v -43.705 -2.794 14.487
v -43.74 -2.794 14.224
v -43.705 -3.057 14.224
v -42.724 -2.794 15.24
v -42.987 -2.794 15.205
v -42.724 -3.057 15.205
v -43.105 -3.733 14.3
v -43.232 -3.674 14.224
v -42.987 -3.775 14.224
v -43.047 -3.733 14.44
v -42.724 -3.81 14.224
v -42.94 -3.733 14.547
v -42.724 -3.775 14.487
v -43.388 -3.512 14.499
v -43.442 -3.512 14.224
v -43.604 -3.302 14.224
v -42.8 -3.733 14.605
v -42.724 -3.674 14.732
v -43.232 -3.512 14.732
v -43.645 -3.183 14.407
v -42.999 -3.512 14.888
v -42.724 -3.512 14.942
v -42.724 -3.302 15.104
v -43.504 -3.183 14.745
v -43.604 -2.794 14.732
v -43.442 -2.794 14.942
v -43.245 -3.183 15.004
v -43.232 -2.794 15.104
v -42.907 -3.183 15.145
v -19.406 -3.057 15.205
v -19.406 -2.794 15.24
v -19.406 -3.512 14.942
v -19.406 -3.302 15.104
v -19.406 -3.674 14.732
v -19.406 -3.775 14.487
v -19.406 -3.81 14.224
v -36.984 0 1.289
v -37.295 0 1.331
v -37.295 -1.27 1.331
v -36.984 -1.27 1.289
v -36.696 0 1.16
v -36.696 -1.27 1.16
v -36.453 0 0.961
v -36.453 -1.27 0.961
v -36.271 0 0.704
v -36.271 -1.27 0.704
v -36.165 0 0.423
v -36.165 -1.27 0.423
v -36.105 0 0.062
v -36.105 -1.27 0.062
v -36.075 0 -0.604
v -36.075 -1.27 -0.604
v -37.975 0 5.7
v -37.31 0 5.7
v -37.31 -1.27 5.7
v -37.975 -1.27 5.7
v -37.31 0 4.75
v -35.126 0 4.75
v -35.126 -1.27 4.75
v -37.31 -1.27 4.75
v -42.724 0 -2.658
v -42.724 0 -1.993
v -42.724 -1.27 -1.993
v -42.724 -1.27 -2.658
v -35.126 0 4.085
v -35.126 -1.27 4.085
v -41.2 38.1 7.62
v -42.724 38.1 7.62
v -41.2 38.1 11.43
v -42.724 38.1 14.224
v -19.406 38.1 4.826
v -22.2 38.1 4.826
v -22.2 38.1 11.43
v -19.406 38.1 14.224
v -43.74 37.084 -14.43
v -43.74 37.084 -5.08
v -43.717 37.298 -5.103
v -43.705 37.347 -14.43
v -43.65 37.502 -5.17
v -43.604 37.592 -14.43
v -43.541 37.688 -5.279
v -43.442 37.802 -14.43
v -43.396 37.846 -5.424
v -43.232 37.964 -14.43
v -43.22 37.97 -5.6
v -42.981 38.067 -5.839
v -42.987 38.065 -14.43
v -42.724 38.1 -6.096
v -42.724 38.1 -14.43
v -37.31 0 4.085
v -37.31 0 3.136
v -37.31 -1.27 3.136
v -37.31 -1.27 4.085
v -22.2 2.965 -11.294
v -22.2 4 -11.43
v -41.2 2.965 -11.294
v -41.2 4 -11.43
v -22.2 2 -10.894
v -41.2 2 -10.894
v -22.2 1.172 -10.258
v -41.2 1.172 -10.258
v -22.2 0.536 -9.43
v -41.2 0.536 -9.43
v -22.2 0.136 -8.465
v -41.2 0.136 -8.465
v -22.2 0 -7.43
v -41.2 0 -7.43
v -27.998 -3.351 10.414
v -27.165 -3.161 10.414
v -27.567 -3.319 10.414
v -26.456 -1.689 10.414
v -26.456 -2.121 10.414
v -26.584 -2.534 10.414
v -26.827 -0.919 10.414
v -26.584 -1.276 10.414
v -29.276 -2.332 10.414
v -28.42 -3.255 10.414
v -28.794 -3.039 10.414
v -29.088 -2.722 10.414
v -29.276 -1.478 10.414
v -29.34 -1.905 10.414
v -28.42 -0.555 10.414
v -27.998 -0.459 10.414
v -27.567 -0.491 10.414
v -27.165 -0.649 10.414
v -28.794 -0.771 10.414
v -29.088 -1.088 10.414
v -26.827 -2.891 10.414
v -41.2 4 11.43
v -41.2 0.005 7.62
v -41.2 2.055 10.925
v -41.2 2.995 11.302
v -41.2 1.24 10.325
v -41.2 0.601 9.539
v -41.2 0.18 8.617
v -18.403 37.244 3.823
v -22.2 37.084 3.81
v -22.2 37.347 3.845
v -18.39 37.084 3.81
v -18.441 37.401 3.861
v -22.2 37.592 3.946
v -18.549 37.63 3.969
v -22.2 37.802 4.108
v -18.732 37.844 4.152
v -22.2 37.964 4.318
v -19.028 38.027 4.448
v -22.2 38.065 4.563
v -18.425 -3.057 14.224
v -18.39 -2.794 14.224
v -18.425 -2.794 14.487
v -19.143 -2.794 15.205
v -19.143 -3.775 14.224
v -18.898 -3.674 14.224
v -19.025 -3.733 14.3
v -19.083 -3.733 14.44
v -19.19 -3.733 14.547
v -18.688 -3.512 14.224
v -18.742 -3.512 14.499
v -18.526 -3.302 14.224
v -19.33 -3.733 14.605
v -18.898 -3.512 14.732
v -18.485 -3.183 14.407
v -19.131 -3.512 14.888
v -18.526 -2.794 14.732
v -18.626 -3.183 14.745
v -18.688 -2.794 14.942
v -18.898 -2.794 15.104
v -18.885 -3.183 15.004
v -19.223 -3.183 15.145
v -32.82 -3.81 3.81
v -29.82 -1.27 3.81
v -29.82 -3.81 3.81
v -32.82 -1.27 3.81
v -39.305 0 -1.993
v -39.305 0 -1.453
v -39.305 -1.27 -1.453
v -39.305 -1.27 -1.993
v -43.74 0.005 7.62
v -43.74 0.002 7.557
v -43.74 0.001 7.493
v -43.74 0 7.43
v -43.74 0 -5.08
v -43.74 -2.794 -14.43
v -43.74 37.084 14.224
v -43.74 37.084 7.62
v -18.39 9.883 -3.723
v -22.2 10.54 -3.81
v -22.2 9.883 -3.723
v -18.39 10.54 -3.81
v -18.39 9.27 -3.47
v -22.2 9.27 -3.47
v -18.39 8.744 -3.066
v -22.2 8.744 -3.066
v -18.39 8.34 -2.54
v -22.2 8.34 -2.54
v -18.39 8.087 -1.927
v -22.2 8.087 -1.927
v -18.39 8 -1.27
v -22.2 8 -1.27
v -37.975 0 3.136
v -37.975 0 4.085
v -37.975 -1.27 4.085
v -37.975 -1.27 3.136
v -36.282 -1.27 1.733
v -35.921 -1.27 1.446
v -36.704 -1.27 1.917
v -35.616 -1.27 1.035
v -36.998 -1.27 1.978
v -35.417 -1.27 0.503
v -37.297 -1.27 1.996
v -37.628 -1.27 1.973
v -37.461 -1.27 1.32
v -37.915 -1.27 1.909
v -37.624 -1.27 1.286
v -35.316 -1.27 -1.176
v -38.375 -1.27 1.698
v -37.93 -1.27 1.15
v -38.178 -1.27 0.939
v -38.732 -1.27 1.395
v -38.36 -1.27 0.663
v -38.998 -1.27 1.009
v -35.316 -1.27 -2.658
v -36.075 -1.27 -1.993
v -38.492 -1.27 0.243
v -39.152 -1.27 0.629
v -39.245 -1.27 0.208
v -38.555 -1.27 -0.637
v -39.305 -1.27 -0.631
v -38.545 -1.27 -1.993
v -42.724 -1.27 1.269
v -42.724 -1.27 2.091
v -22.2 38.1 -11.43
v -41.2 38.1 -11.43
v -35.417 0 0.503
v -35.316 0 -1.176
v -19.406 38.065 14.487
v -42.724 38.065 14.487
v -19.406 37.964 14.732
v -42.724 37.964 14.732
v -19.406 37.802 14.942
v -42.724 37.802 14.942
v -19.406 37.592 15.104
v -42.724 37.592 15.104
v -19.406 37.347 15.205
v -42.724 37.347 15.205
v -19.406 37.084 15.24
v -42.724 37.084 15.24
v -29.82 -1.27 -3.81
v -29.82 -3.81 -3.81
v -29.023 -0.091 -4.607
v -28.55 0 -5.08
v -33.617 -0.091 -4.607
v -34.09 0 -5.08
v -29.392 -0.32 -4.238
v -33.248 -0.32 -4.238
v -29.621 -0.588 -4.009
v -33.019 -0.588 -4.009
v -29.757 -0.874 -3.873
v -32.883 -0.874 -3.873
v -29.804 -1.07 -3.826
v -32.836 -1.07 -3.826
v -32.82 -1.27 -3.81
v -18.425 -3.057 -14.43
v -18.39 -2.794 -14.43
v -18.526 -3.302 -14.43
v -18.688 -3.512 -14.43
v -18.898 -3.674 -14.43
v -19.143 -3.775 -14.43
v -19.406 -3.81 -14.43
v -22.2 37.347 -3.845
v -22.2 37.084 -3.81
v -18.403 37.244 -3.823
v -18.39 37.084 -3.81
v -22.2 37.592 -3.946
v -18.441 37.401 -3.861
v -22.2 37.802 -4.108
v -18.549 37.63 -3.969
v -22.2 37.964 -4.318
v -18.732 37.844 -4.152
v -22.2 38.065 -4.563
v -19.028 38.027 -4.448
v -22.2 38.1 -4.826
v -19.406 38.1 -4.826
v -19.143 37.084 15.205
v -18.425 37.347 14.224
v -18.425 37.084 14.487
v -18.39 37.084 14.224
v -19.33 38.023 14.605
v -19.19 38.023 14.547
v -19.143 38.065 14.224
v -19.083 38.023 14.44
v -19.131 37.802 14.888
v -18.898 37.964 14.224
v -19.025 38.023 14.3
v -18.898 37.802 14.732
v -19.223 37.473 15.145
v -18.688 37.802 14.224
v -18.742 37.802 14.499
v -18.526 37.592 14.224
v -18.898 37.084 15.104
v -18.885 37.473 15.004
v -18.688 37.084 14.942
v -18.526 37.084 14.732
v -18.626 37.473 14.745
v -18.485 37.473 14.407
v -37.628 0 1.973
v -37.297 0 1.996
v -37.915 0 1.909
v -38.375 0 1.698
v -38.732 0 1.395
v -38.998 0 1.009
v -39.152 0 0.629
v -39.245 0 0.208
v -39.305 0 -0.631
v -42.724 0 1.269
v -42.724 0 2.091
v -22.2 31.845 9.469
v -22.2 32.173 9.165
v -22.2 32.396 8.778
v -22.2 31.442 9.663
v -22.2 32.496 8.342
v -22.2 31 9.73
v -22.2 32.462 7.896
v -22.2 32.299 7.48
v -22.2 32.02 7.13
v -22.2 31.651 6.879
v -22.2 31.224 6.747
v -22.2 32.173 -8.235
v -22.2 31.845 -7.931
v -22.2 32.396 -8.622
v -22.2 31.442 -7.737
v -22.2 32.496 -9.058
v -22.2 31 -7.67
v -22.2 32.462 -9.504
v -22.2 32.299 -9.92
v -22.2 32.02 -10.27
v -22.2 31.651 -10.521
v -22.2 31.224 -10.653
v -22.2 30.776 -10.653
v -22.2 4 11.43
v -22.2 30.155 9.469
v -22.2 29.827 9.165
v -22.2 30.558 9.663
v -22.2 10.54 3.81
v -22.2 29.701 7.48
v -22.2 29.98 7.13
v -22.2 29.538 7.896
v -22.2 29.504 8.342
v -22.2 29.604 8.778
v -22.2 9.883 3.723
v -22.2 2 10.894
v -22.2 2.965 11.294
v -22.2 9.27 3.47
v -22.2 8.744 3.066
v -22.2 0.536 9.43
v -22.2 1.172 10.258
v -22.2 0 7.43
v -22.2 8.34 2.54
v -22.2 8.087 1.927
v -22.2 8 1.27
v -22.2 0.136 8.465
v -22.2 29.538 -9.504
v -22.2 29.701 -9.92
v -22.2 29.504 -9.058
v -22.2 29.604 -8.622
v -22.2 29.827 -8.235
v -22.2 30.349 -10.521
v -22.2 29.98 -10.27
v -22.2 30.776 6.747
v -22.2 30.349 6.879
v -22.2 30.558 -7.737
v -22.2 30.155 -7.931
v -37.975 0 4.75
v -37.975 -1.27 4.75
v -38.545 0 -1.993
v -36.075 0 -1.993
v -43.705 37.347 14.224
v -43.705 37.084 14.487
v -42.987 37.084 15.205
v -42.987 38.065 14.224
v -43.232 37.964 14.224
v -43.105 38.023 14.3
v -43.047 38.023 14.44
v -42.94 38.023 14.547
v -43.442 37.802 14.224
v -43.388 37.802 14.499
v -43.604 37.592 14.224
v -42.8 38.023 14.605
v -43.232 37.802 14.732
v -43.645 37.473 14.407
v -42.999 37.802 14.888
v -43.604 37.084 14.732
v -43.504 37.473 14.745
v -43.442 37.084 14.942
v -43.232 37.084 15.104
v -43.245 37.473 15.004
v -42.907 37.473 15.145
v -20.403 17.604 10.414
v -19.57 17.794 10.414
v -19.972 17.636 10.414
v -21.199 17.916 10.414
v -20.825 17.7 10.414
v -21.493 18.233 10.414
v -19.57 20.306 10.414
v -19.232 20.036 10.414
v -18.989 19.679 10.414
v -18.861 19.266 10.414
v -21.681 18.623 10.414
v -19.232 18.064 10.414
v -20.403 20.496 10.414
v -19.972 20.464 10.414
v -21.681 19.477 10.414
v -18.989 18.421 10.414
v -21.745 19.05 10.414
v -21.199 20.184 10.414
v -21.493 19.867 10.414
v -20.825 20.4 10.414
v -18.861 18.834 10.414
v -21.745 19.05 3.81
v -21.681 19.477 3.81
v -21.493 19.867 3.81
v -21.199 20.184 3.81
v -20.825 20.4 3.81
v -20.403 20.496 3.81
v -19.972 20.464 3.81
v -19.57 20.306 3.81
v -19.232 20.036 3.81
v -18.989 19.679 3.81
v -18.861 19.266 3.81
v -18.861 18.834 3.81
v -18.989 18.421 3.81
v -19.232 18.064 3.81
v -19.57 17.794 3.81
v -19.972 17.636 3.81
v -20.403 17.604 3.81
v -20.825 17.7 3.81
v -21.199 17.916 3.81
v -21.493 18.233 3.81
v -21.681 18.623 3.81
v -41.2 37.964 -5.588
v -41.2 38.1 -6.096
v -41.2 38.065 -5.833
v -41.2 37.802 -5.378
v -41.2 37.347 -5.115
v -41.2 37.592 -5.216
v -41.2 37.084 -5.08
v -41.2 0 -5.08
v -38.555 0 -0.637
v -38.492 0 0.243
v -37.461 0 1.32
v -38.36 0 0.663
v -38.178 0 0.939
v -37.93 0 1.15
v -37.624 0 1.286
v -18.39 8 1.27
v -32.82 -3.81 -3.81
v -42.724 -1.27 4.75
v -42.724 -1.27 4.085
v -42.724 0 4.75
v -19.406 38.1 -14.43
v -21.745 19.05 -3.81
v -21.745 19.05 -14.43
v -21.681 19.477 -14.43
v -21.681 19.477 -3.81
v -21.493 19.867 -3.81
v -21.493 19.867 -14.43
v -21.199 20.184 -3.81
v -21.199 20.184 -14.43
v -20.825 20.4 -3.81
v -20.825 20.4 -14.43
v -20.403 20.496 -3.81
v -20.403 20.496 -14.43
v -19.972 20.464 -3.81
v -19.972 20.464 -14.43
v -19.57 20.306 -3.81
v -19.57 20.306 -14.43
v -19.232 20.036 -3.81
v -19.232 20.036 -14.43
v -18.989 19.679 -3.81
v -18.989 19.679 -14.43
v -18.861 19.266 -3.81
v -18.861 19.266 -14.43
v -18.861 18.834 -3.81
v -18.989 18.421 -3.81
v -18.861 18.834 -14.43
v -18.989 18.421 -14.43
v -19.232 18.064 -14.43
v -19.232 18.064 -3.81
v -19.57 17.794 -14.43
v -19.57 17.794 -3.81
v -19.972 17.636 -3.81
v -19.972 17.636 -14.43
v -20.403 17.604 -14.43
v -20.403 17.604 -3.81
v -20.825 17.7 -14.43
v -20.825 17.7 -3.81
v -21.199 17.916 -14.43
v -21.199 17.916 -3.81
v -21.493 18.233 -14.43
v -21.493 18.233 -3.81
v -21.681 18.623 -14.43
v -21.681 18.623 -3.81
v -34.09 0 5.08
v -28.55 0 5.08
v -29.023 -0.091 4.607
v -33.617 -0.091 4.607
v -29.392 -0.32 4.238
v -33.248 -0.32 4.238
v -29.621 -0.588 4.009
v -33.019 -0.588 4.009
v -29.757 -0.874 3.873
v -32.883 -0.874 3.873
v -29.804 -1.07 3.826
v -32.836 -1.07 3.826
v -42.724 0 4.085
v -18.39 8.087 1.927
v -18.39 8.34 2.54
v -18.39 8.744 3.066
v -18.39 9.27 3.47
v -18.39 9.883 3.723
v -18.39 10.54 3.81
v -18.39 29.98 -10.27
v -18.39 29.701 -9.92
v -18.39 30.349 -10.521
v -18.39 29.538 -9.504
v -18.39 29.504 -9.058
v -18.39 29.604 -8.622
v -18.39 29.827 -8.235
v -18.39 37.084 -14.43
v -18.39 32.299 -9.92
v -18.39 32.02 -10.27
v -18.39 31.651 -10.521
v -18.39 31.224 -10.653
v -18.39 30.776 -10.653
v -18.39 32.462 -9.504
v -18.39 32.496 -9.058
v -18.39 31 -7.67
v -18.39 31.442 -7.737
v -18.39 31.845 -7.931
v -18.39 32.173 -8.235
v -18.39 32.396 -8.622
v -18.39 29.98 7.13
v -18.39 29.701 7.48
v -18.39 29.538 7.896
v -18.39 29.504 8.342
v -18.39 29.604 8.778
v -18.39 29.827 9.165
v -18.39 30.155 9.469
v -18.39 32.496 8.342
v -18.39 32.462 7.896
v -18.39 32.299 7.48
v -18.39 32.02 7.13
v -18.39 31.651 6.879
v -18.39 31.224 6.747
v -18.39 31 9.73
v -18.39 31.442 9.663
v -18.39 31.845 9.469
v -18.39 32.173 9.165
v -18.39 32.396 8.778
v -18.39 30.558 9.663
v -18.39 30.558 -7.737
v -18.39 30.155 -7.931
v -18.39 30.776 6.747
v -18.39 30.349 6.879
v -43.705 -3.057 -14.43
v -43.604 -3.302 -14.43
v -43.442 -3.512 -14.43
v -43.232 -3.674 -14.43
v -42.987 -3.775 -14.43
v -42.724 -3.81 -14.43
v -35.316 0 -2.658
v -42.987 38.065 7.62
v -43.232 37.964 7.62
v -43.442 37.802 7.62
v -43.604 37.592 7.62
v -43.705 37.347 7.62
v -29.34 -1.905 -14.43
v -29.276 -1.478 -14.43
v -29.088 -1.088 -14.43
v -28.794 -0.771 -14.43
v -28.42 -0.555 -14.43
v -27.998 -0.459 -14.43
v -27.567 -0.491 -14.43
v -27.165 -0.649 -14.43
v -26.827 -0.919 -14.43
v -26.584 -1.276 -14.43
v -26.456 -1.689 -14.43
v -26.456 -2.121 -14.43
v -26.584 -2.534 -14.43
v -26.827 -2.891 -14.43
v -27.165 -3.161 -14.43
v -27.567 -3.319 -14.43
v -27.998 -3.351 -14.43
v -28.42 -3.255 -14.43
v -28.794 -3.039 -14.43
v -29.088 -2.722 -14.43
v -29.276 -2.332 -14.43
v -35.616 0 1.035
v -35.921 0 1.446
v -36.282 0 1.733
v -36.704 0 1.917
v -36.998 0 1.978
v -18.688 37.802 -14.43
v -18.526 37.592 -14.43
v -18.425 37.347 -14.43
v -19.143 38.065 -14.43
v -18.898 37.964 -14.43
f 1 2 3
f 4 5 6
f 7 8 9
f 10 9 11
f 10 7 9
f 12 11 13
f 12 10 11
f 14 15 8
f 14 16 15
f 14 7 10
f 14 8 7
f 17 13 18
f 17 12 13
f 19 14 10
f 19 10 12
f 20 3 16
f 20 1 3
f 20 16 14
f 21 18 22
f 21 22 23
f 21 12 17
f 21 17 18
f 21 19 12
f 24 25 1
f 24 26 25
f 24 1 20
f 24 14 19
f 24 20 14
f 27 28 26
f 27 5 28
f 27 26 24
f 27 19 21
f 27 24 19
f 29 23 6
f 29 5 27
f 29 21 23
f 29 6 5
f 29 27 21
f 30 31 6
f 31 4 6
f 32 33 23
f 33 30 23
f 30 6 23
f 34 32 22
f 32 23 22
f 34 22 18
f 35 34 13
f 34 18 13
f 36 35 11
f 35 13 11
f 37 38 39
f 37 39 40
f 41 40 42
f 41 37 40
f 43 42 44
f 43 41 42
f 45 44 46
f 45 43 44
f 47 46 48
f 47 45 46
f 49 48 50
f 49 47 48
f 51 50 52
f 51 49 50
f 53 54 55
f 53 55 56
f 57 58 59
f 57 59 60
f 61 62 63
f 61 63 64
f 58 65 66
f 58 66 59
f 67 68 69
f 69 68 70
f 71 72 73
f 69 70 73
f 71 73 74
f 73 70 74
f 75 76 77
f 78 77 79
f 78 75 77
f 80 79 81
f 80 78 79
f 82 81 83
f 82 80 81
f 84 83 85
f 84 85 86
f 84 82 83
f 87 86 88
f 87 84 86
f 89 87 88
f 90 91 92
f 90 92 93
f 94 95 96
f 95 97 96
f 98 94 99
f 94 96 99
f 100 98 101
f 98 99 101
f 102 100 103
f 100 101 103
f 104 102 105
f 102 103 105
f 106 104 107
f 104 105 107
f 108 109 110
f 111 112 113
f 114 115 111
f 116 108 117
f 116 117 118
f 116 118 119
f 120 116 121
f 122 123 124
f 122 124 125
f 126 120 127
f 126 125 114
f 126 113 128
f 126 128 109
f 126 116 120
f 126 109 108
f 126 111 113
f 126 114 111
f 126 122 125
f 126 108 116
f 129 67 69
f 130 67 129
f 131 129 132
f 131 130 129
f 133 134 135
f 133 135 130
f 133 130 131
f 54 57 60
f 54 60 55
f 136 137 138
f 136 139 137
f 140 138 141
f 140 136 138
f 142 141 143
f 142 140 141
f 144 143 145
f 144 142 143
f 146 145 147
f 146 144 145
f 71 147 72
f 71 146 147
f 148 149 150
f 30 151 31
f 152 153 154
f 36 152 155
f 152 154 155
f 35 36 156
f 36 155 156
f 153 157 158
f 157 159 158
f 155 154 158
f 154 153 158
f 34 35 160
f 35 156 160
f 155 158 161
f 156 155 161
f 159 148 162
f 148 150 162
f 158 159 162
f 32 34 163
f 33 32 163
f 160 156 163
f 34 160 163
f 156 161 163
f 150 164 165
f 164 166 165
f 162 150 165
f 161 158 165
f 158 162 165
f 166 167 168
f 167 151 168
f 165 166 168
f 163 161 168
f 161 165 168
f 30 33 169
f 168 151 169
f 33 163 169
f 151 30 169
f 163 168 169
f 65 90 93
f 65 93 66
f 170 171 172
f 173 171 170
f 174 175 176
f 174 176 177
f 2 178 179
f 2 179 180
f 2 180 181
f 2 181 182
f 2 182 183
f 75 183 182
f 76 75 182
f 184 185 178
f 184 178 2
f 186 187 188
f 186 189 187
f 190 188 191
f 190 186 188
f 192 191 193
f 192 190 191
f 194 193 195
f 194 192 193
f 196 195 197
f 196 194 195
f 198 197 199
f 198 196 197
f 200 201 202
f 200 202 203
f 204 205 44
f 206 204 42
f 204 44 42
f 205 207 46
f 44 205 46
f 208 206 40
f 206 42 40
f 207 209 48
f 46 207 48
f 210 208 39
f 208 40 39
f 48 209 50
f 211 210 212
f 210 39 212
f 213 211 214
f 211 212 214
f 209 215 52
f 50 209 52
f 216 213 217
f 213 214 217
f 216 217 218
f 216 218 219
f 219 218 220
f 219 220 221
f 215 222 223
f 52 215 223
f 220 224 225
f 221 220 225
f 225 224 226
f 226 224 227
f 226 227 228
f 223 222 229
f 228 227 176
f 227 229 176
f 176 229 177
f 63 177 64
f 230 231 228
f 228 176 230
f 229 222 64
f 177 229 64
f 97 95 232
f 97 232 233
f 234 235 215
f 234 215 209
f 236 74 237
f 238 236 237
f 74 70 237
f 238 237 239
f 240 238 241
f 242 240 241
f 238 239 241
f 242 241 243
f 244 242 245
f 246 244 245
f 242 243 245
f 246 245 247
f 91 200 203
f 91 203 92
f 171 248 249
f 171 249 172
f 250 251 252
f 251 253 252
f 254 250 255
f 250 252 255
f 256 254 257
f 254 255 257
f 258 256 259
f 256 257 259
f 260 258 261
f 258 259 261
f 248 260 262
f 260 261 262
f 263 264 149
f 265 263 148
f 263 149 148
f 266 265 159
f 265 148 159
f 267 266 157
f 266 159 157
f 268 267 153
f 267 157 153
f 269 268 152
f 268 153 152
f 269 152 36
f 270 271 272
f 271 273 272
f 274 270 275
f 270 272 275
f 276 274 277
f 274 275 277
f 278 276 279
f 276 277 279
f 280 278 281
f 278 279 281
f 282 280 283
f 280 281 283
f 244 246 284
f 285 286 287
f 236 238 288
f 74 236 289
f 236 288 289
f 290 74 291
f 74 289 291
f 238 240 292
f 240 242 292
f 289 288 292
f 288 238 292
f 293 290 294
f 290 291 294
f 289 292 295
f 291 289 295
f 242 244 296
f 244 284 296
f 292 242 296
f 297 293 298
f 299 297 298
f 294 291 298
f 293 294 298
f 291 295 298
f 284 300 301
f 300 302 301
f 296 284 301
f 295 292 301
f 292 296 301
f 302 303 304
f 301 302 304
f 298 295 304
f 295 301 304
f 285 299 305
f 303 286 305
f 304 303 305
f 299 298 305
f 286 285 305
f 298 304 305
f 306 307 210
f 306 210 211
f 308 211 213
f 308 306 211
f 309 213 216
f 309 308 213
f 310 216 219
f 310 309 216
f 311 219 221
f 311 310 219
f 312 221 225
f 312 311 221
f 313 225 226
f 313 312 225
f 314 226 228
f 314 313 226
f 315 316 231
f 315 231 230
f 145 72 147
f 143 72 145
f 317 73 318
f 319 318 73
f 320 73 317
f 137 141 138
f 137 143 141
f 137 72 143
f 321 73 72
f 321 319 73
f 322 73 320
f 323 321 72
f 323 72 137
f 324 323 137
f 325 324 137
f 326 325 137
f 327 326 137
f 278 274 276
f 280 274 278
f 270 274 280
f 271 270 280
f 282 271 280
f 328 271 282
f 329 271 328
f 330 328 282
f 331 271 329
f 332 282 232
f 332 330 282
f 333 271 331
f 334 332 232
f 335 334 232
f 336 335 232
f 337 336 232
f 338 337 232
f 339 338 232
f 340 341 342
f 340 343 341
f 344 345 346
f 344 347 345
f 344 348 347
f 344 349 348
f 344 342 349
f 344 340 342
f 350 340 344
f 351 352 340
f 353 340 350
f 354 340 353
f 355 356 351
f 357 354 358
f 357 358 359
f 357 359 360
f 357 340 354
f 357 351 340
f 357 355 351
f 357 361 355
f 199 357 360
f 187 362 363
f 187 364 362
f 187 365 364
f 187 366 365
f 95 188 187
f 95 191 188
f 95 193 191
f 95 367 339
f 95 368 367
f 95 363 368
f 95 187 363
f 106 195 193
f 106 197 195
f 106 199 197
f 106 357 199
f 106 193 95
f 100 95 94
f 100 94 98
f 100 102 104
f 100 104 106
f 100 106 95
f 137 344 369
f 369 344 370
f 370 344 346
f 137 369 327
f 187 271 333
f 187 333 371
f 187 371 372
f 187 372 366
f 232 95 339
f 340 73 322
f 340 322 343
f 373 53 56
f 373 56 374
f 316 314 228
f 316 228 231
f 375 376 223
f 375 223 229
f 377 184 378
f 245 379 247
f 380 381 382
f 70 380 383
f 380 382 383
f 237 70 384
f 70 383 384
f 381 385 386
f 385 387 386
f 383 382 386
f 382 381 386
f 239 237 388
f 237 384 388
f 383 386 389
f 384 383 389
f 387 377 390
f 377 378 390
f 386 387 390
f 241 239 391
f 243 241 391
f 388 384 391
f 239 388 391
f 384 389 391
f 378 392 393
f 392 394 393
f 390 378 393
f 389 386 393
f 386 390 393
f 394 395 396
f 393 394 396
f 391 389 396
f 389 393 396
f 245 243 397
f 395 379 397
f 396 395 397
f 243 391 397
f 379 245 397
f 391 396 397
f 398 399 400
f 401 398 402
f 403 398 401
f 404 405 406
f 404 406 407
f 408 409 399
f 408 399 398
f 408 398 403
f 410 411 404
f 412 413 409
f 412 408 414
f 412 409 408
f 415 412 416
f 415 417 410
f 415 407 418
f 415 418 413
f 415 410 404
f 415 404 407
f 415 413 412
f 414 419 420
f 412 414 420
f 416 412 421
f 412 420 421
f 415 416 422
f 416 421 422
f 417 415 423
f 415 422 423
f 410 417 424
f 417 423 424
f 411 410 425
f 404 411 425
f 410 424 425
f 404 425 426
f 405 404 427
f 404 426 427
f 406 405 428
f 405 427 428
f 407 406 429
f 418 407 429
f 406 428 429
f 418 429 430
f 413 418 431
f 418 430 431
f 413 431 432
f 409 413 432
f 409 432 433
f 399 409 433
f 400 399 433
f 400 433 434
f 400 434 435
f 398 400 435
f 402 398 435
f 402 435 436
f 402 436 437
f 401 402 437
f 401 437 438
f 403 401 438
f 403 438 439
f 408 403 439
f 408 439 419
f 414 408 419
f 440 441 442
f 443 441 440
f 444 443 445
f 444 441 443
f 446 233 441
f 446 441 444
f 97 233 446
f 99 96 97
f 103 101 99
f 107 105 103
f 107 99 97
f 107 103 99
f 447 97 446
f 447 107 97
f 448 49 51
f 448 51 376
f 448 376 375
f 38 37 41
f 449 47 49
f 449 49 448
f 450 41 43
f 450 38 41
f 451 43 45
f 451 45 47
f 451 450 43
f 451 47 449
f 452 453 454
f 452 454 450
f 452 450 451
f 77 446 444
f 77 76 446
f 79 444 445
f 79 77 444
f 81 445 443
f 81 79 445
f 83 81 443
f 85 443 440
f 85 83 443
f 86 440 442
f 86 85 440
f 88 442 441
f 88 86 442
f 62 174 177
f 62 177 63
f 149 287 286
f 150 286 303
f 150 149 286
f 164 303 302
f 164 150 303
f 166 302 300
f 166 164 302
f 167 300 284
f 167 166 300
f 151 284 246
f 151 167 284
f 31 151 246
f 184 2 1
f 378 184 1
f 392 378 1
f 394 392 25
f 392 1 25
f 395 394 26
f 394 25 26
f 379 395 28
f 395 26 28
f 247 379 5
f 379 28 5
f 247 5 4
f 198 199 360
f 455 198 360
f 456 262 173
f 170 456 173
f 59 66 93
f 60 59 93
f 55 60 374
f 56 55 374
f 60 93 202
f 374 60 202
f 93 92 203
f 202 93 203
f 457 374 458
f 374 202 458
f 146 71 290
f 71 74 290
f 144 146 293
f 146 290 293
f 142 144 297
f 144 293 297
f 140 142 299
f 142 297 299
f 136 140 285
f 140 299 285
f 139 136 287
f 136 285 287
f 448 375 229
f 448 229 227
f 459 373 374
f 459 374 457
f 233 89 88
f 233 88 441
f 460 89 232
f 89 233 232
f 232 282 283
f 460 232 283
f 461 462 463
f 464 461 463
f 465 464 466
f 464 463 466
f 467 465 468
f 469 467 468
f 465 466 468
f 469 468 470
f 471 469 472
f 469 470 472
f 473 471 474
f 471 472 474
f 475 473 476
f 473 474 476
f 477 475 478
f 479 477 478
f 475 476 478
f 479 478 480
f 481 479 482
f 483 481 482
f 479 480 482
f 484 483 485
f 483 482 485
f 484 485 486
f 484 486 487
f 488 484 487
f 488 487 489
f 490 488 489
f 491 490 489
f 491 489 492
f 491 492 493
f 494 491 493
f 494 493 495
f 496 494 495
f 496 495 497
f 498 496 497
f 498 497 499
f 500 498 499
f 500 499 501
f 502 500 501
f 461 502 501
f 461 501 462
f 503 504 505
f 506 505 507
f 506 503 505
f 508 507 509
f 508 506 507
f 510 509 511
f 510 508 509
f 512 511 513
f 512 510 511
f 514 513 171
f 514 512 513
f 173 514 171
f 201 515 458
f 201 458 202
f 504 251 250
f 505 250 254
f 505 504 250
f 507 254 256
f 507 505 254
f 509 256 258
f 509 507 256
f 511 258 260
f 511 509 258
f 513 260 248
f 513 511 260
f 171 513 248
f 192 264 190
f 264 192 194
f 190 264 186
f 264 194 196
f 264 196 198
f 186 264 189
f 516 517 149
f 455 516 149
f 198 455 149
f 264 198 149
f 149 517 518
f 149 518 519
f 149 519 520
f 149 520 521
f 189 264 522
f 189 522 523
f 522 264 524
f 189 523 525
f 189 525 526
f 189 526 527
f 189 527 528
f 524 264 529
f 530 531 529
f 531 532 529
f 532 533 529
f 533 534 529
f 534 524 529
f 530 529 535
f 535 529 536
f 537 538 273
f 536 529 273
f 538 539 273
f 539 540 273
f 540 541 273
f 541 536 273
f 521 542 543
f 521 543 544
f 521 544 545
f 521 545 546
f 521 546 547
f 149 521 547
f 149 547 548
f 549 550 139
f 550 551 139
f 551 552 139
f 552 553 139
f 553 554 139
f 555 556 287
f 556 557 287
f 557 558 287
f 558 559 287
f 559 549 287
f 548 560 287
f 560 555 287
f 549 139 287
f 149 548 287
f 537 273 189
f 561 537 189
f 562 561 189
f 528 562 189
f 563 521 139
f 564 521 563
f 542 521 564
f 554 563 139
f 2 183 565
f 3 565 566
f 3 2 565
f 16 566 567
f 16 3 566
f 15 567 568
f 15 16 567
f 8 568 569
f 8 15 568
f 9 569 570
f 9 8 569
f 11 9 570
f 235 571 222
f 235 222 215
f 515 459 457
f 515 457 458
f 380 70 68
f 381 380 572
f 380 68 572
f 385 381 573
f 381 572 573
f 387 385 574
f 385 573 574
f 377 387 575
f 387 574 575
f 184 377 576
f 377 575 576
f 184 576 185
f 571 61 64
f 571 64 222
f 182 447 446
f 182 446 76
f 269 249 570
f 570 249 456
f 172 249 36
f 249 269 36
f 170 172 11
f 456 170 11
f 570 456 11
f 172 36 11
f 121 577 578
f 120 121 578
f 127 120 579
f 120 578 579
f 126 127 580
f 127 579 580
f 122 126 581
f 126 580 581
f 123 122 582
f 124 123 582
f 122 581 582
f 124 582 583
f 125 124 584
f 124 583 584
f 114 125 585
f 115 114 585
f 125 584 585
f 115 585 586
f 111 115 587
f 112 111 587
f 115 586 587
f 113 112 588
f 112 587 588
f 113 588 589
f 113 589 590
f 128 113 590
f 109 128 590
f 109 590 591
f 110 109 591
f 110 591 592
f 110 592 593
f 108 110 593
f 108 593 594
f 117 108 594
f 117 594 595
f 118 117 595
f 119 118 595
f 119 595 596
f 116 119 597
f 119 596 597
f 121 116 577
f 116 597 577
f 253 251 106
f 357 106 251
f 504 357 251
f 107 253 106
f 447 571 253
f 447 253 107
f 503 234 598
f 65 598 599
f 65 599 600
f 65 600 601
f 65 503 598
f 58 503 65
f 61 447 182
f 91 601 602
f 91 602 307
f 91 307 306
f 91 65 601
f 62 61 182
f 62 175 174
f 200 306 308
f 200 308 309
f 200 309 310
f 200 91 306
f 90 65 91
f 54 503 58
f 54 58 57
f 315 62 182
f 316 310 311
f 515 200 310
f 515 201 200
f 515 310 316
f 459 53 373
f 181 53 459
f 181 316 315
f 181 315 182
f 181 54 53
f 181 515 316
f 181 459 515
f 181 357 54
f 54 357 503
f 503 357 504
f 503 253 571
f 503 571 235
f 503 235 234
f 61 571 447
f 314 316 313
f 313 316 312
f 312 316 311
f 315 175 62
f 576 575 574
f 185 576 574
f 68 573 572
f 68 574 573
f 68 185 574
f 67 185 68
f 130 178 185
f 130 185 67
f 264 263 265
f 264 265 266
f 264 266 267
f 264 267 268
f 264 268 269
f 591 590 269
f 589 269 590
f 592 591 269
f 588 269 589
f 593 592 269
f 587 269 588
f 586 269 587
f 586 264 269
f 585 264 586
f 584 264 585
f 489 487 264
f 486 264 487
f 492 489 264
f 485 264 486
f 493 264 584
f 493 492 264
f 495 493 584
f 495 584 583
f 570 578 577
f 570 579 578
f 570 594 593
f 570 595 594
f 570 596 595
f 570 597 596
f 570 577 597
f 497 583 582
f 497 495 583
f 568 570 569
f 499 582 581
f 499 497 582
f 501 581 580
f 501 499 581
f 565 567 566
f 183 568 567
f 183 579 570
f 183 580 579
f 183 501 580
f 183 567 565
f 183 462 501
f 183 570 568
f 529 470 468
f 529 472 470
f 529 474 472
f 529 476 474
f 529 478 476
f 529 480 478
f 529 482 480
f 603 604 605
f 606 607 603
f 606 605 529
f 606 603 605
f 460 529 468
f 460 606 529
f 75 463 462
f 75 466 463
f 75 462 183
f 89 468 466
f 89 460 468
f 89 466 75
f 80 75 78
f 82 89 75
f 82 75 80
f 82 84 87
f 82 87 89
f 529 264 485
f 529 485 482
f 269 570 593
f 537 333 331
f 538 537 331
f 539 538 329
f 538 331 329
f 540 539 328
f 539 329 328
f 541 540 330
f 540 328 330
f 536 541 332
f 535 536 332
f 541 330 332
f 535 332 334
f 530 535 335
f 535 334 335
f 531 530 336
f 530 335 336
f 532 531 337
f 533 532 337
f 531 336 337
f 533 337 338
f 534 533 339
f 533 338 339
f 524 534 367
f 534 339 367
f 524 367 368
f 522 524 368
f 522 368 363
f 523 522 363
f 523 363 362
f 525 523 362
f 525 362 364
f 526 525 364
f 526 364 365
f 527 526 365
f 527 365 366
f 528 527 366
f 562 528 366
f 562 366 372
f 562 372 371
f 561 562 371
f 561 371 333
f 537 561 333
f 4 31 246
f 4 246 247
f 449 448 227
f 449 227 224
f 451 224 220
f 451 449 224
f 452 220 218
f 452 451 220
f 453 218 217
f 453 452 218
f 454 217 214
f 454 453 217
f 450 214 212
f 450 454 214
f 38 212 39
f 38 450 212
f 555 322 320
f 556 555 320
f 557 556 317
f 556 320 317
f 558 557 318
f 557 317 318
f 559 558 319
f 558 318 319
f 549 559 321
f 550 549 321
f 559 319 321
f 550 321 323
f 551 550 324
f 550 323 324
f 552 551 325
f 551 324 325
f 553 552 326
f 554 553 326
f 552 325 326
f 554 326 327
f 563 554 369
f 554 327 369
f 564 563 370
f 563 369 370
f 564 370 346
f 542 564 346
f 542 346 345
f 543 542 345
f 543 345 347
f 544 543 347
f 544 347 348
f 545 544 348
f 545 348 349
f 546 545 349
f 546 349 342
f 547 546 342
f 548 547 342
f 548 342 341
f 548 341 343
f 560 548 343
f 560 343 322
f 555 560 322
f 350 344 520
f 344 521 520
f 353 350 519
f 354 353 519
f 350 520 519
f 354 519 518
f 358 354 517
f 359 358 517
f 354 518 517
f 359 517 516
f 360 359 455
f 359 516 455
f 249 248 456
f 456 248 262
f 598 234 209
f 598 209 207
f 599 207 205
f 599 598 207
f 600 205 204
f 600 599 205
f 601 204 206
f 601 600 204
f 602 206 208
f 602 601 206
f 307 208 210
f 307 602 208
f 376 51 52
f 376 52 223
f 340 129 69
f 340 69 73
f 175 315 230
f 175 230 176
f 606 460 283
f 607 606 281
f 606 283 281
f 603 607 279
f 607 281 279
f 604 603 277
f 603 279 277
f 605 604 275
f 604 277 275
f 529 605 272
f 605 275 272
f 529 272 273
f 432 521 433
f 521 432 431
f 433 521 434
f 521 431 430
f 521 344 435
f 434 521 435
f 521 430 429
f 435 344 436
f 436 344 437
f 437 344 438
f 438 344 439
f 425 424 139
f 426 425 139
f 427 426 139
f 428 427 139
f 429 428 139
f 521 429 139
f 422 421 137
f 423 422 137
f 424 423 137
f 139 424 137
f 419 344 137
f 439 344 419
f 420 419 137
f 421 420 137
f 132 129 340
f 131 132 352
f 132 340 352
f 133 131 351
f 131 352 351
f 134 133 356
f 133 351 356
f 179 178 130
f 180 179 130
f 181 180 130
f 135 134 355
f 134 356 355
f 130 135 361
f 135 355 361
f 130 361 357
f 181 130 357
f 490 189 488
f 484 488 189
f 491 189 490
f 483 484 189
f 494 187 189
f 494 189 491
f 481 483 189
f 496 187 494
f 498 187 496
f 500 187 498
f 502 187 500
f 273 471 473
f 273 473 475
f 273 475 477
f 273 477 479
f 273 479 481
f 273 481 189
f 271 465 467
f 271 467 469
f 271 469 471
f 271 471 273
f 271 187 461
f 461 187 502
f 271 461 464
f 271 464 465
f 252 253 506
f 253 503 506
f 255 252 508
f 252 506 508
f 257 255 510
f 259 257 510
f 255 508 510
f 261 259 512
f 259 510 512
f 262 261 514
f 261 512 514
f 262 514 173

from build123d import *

# Parameters (mm, degrees)
BOSS_EXTRUDE2_DEPTH = 38.1
SKETCH1_W           = 25.35
SKETCH1_H           = 29.67
BOSS_EXTRUDE3_DEPTH = 3.81
SKETCH3_W           = 3
SKETCH3_H           = 7.62
CUT_EXTRUDE1_DEPTH  = 4.81
SKETCH4_W           = 7.62
SKETCH4_H           = 30.1
CUT_EXTRUDE2_DEPTH  = 4.81
SKETCH5_R           = 1.5
CUT_EXTRUDE3_DEPTH  = 4.81
SKETCH6_R           = 1.45
CUT_EXTRUDE4_DEPTH  = 24.844
FILLET1_R           = 4
FILLET4_R           = 2.54
FILLET2_R           = 1.016
FILLET3_R           = 1.27
FILLET5_R           = 1.016
CUT_EXTRUDE5_DEPTH  = 1.27
CUT_EXTRUDE6_DEPTH  = 1.27


with BuildPart() as part:
    # Sketch2 → Boss-Extrude2 (new body)
    with BuildSketch(Plane(origin=(0, 0, 0), x_dir=(1, 0, 0), z_dir=(0, 1, 0))):
        Polygon((-9.5, -11.43), (9.5, -11.43), (9.5, -5.08), (12.04, -5.08), (12.04, -14.43), (-13.31, -14.43), (-13.31, 15.24), (12.04, 15.24), (12.04, 7.62), (9.5, 7.62), (9.5, 11.43), (-9.5, 11.43), align=None)
    extrude(amount=BOSS_EXTRUDE2_DEPTH)

    # Sketch1 → Boss-Extrude3 (add)
    with BuildSketch(Plane(origin=(0, 0, 0), x_dir=(1, 0, 0), z_dir=(0, 1, 0))):
        with Locations((-0.635, 0.405)):
            Rectangle(SKETCH1_W, SKETCH1_H)
    extrude(amount=-BOSS_EXTRUDE3_DEPTH)

    # Sketch3 → Cut-Extrude1 (cut, through all)
    with BuildSketch(Plane(origin=(0, 0, 0), x_dir=(1, 0, 0), z_dir=(0, 1, 0))):
        with Locations((-0.38, 0)):
            Rectangle(SKETCH3_W, SKETCH3_H)
    extrude(amount=-CUT_EXTRUDE1_DEPTH, mode=Mode.SUBTRACT)

    # Sketch4 → Cut-Extrude2 (cut, through all)
    with BuildSketch(Plane(origin=(-9.5, 0, 0), x_dir=(0, 0, -1), z_dir=(1, 0, 0))):
        with Locations((0, 23.05)):
            Rectangle(SKETCH4_W, SKETCH4_H)
    extrude(amount=-CUT_EXTRUDE2_DEPTH, mode=Mode.SUBTRACT)

    # Sketch5 → Cut-Extrude3 (cut, through all)
    with BuildSketch(Plane(origin=(-9.5, 0, 0), x_dir=(0, 0, -1), z_dir=(1, 0, 0))):
        with Locations((-9.1700096, 31)):
            Circle(SKETCH5_R)
        with Locations((8.2299904, 31)):
            Circle(SKETCH5_R)
    extrude(amount=-CUT_EXTRUDE3_DEPTH, mode=Mode.SUBTRACT)

    # Sketch6 → Cut-Extrude4 (cut)
    with BuildSketch(Plane.XY.offset(14.43)):
        with Locations((-11.405, 19.05)):
            Circle(SKETCH6_R)
        with Locations((-3.81, -1.905)):
            Circle(SKETCH6_R)
    extrude(amount=-CUT_EXTRUDE4_DEPTH, mode=Mode.SUBTRACT)

    # Fillet1
    fillet1_edges = [part.edges().sort_by_distance(p)[0] for p in [
        (0, 0, -11.43),
        (0, 0, 11.43),
    ]]
    fillet(fillet1_edges, radius=FILLET1_R)


with BuildPart() as body_2:
    # Mirror1: mirrored copy
    add(part.part.mirror(Plane.XY))

    # Fillet4
    fillet4_edges = [body_2.edges().sort_by_distance(p)[0] for p in [
        (-11.405, 8, -3.81),
        (-11.405, 8, 3.81),
    ]]
    fillet(fillet4_edges, radius=FILLET4_R)

    # Fillet2
    fillet2_edges = [body_2.edges().sort_by_distance(p)[0] for p in [
        (-13.31, 17.145, 15.24),
        (12.04, 17.145, 15.24),
        (12.04, -3.81, 0.405),
        (-13.31, -3.81, 0.405),
        (-0.635, -3.81, 15.24),
        (12.04, 38.1, 11.43),
        (-0.635, 38.1, 15.24),
        (-13.31, 38.1, 9.525),
        (-13.31, 38.1, -9.12),
        (-11.405, 38.1, -3.81),
        (-11.405, 38.1, 3.81),
    ]]
    fillet(fillet2_edges, radius=FILLET2_R)

    # Fillet3
    fillet3_edges = [body_2.edges().sort_by_distance(p)[0] for p in [
        (-1.88, 0, 0),
        (-0.38, 0, -3.81),
        (1.12, 0, 0),
        (-0.38, 0, 3.81),
    ]]
    fillet(fillet3_edges, radius=FILLET3_R)

    # Fillet5
    fillet5_edges = [body_2.edges().sort_by_distance(p)[0] for p in [
        (12.04, 38.1, -9.755),
        (10.77, 38.1, -5.08),
    ]]
    fillet(fillet5_edges, radius=FILLET5_R)


with BuildPart() as body_2_2:
    # Mirror3: mirrored copy
    add(body_2.part.mirror(Plane.ZY.offset(15.85)))

    # Sketch8 → Cut-Extrude6 (cut)
    with BuildSketch(Plane(origin=(0, 0, 0), x_dir=(1, 0, 0), z_dir=(0, 1, 0))):
        Polygon((-35.125709402, -4.085355142), (-35.125709402, -4.750205569), (-37.310217949, -4.750205569), (-37.310217949, -5.699991894), (-37.975068376, -5.699991894), (-37.975068376, -4.750205569), (-42.724, -4.750205569), (-42.724, -4.085355142), (-37.975068376, -4.085355142), (-37.975068376, -3.135568817), (-37.310217949, -3.135568817), (-37.310217949, -4.085355142), align=None)
        with BuildLine():
            Line((-35.315666667, 2.658127764), (-35.315666667, 1.175570673))
            add(Edge.make_bspline(
                [(-35.315666667, 1.175570673), (-35.31599599, 1.076635284), (-35.316628328, 0.886668378), (-35.320154193, 0.614521623), (-35.330259913, 0.367237601), (-35.338956414, 0.144945608), (-35.354814357, -0.052350279), (-35.36997106, -0.225255044), (-35.389811975, -0.372972337), (-35.408238454, -0.462392723), (-35.416581464, -0.502879848)],
                knots=[0, 0, 0, 0, 0.000296812, 0.000569912, 0.000816423, 0.001039272, 0.001237207, 0.001410128, 0.001559979, 0.001683965, 0.001683965, 0.001683965, 0.001683965], degree=3))
            add(Edge.make_bspline(
                [(-35.416581464, -0.502879848), (-35.429971598, -0.557081491), (-35.456466218, -0.664328507), (-35.512494413, -0.81872563), (-35.577224639, -0.965915382), (-35.653842803, -1.105345402), (-35.741012521, -1.237028627), (-35.839243094, -1.360767889), (-35.949034771, -1.475855736), (-36.067583937, -1.583177714), (-36.195924968, -1.680461633), (-36.332188282, -1.764648136), (-36.475521634, -1.836736616), (-36.626424162, -1.894287018), (-36.783620234, -1.940584552), (-36.948482467, -1.973239748), (-37.120273858, -1.992820602), (-37.237448007, -1.99481431), (-37.296861579, -1.995825227)],
                knots=[0, 0, 0, 0, 0.000167388, 0.000331205, 0.000491982, 0.000649388, 0.000807854, 0.000965226, 0.001122688, 0.00128451, 0.00144449, 0.001605103, 0.001764387, 0.001925062, 0.002088959, 0.002255437, 0.002428663, 0.002606847, 0.002606847, 0.002606847, 0.002606847], degree=3))
            add(Edge.make_bspline(
                [(-37.296861579, -1.995825227), (-37.395572664, -1.992715929), (-37.588183557, -1.986648882), (-37.867710836, -1.930079619), (-38.128467354, -1.83742344), (-38.370090229, -1.709723959), (-38.587996871, -1.547178937), (-38.778744039, -1.351836783), (-38.939838712, -1.124695094), (-39.050363857, -0.91224832), (-39.121480472, -0.724494941), (-39.171769577, -0.569470973), (-39.209969011, -0.400237622), (-39.244686959, -0.219222799), (-39.271179543, -0.025028326), (-39.289994312, 0.181954737), (-39.302092352, 0.402244067), (-39.303859928, 0.553246562), (-39.304769231, 0.630927577)],
                knots=[0, 0, 0, 0, 0.000295861, 0.000577301, 0.000851427, 0.001123618, 0.001394011, 0.001663719, 0.001939227, 0.00222663, 0.002379313, 0.002541237, 0.002715098, 0.00289934, 0.003094106, 0.003302766, 0.003522724, 0.003755761, 0.003755761, 0.003755761, 0.003755761], degree=3))
            Line((-39.304769231, 0.630927577), (-42.724, -2.09080386))
            Line((-42.724, -2.09080386), (-42.724, -1.268645072))
            Line((-42.724, -1.268645072), (-39.304769231, 1.453086364))
            Line((-39.304769231, 1.453086364), (-39.304769231, 1.993277337))
            Line((-39.304769231, 1.993277337), (-42.724, 1.993277337))
            Line((-42.724, 1.993277337), (-42.724, 2.658127764))
            Line((-42.724, 2.658127764), (-35.315666667, 2.658127764))
        make_face()
        with BuildLine():
            Line((-36.075495726, 1.993277337), (-38.544940171, 1.993277337))
            Line((-38.544940171, 1.993277337), (-38.555328459, 0.636863742))
            add(Edge.make_bspline(
                [(-38.555328459, 0.636863742), (-38.555356476, 0.573532993), (-38.555410782, 0.450779964), (-38.546957292, 0.27319022), (-38.537340592, 0.107835996), (-38.522631175, -0.044650303), (-38.503674054, -0.184336572), (-38.479961405, -0.31115373), (-38.452333452, -0.425306376), (-38.409577922, -0.55844757), (-38.341800903, -0.707074645), (-38.243358644, -0.86880077), (-38.118738571, -1.006056387), (-37.978502281, -1.124397331), (-37.821144229, -1.215549999), (-37.653648946, -1.281893149), (-37.477462473, -1.323527172), (-37.356448737, -1.328476869), (-37.295377537, -1.3309748)],
                knots=[0, 0, 0, 0, 0.000189963, 0.000368203, 0.000533258, 0.000686833, 0.000827661, 0.00095602, 0.001073718, 0.001179783, 0.001375069, 0.001562422, 0.001745315, 0.001928677, 0.002110918, 0.002288116, 0.002467759, 0.002650784, 0.002650784, 0.002650784, 0.002650784], degree=3))
            add(Edge.make_bspline(
                [(-37.295377537, -1.3309748), (-37.235784101, -1.328469191), (-37.117691657, -1.323503988), (-36.945281883, -1.281812481), (-36.781395026, -1.214486794), (-36.629154879, -1.120080599), (-36.489810496, -1.006005192), (-36.372231955, -0.870523684), (-36.27376678, -0.720459089), (-36.211303642, -0.580102451), (-36.172931546, -0.454736188), (-36.145962748, -0.345871562), (-36.124112719, -0.222396299), (-36.107124734, -0.084606312), (-36.091837488, 0.067249114), (-36.081925643, 0.233585788), (-36.075934923, 0.414211629), (-36.075645532, 0.539406498), (-36.075495726, 0.604214837)],
                knots=[0, 0, 0, 0, 0.000178585, 0.00035389, 0.000528894, 0.000708076, 0.000889348, 0.001067068, 0.001244067, 0.001426091, 0.001525599, 0.001637179, 0.00176235, 0.00190151, 0.002053608, 0.002220145, 0.002401295, 0.00259571, 0.00259571, 0.00259571, 0.00259571], degree=3))
            Line((-36.075495726, 0.604214837), (-36.075495726, 1.993277337))
        make_face(mode=Mode.SUBTRACT)
    extrude(amount=-CUT_EXTRUDE6_DEPTH, mode=Mode.SUBTRACT)


with BuildPart() as body_2_1:
    add(body_2.part)

    # Sketch7 → Cut-Extrude5 (cut)
    with BuildSketch(Plane(origin=(0, 0, 0), x_dir=(1, 0, 0), z_dir=(0, 1, 0))):
        Polygon((4.129986879, -2.992887734), (4.129986879, -2.328037307), (10.778491153, -2.328037307), (10.778491153, 0.521321667), (11.538320213, 0.521321667), (11.538320213, -2.992887734), align=None)
        Polygon((3.940029614, 2.230937052), (3.940029614, 2.895787479), (6.124538161, 2.895787479), (6.124538161, 3.845573804), (6.789388589, 3.845573804), (6.789388589, 2.895787479), (11.538320213, 2.895787479), (11.538320213, 2.230937052), (6.789388589, 2.230937052), (6.789388589, 1.281150727), (6.124538161, 1.281150727), (6.124538161, 2.230937052), align=None)
    extrude(amount=-CUT_EXTRUDE5_DEPTH, mode=Mode.SUBTRACT)


solid = body_2_2.part
